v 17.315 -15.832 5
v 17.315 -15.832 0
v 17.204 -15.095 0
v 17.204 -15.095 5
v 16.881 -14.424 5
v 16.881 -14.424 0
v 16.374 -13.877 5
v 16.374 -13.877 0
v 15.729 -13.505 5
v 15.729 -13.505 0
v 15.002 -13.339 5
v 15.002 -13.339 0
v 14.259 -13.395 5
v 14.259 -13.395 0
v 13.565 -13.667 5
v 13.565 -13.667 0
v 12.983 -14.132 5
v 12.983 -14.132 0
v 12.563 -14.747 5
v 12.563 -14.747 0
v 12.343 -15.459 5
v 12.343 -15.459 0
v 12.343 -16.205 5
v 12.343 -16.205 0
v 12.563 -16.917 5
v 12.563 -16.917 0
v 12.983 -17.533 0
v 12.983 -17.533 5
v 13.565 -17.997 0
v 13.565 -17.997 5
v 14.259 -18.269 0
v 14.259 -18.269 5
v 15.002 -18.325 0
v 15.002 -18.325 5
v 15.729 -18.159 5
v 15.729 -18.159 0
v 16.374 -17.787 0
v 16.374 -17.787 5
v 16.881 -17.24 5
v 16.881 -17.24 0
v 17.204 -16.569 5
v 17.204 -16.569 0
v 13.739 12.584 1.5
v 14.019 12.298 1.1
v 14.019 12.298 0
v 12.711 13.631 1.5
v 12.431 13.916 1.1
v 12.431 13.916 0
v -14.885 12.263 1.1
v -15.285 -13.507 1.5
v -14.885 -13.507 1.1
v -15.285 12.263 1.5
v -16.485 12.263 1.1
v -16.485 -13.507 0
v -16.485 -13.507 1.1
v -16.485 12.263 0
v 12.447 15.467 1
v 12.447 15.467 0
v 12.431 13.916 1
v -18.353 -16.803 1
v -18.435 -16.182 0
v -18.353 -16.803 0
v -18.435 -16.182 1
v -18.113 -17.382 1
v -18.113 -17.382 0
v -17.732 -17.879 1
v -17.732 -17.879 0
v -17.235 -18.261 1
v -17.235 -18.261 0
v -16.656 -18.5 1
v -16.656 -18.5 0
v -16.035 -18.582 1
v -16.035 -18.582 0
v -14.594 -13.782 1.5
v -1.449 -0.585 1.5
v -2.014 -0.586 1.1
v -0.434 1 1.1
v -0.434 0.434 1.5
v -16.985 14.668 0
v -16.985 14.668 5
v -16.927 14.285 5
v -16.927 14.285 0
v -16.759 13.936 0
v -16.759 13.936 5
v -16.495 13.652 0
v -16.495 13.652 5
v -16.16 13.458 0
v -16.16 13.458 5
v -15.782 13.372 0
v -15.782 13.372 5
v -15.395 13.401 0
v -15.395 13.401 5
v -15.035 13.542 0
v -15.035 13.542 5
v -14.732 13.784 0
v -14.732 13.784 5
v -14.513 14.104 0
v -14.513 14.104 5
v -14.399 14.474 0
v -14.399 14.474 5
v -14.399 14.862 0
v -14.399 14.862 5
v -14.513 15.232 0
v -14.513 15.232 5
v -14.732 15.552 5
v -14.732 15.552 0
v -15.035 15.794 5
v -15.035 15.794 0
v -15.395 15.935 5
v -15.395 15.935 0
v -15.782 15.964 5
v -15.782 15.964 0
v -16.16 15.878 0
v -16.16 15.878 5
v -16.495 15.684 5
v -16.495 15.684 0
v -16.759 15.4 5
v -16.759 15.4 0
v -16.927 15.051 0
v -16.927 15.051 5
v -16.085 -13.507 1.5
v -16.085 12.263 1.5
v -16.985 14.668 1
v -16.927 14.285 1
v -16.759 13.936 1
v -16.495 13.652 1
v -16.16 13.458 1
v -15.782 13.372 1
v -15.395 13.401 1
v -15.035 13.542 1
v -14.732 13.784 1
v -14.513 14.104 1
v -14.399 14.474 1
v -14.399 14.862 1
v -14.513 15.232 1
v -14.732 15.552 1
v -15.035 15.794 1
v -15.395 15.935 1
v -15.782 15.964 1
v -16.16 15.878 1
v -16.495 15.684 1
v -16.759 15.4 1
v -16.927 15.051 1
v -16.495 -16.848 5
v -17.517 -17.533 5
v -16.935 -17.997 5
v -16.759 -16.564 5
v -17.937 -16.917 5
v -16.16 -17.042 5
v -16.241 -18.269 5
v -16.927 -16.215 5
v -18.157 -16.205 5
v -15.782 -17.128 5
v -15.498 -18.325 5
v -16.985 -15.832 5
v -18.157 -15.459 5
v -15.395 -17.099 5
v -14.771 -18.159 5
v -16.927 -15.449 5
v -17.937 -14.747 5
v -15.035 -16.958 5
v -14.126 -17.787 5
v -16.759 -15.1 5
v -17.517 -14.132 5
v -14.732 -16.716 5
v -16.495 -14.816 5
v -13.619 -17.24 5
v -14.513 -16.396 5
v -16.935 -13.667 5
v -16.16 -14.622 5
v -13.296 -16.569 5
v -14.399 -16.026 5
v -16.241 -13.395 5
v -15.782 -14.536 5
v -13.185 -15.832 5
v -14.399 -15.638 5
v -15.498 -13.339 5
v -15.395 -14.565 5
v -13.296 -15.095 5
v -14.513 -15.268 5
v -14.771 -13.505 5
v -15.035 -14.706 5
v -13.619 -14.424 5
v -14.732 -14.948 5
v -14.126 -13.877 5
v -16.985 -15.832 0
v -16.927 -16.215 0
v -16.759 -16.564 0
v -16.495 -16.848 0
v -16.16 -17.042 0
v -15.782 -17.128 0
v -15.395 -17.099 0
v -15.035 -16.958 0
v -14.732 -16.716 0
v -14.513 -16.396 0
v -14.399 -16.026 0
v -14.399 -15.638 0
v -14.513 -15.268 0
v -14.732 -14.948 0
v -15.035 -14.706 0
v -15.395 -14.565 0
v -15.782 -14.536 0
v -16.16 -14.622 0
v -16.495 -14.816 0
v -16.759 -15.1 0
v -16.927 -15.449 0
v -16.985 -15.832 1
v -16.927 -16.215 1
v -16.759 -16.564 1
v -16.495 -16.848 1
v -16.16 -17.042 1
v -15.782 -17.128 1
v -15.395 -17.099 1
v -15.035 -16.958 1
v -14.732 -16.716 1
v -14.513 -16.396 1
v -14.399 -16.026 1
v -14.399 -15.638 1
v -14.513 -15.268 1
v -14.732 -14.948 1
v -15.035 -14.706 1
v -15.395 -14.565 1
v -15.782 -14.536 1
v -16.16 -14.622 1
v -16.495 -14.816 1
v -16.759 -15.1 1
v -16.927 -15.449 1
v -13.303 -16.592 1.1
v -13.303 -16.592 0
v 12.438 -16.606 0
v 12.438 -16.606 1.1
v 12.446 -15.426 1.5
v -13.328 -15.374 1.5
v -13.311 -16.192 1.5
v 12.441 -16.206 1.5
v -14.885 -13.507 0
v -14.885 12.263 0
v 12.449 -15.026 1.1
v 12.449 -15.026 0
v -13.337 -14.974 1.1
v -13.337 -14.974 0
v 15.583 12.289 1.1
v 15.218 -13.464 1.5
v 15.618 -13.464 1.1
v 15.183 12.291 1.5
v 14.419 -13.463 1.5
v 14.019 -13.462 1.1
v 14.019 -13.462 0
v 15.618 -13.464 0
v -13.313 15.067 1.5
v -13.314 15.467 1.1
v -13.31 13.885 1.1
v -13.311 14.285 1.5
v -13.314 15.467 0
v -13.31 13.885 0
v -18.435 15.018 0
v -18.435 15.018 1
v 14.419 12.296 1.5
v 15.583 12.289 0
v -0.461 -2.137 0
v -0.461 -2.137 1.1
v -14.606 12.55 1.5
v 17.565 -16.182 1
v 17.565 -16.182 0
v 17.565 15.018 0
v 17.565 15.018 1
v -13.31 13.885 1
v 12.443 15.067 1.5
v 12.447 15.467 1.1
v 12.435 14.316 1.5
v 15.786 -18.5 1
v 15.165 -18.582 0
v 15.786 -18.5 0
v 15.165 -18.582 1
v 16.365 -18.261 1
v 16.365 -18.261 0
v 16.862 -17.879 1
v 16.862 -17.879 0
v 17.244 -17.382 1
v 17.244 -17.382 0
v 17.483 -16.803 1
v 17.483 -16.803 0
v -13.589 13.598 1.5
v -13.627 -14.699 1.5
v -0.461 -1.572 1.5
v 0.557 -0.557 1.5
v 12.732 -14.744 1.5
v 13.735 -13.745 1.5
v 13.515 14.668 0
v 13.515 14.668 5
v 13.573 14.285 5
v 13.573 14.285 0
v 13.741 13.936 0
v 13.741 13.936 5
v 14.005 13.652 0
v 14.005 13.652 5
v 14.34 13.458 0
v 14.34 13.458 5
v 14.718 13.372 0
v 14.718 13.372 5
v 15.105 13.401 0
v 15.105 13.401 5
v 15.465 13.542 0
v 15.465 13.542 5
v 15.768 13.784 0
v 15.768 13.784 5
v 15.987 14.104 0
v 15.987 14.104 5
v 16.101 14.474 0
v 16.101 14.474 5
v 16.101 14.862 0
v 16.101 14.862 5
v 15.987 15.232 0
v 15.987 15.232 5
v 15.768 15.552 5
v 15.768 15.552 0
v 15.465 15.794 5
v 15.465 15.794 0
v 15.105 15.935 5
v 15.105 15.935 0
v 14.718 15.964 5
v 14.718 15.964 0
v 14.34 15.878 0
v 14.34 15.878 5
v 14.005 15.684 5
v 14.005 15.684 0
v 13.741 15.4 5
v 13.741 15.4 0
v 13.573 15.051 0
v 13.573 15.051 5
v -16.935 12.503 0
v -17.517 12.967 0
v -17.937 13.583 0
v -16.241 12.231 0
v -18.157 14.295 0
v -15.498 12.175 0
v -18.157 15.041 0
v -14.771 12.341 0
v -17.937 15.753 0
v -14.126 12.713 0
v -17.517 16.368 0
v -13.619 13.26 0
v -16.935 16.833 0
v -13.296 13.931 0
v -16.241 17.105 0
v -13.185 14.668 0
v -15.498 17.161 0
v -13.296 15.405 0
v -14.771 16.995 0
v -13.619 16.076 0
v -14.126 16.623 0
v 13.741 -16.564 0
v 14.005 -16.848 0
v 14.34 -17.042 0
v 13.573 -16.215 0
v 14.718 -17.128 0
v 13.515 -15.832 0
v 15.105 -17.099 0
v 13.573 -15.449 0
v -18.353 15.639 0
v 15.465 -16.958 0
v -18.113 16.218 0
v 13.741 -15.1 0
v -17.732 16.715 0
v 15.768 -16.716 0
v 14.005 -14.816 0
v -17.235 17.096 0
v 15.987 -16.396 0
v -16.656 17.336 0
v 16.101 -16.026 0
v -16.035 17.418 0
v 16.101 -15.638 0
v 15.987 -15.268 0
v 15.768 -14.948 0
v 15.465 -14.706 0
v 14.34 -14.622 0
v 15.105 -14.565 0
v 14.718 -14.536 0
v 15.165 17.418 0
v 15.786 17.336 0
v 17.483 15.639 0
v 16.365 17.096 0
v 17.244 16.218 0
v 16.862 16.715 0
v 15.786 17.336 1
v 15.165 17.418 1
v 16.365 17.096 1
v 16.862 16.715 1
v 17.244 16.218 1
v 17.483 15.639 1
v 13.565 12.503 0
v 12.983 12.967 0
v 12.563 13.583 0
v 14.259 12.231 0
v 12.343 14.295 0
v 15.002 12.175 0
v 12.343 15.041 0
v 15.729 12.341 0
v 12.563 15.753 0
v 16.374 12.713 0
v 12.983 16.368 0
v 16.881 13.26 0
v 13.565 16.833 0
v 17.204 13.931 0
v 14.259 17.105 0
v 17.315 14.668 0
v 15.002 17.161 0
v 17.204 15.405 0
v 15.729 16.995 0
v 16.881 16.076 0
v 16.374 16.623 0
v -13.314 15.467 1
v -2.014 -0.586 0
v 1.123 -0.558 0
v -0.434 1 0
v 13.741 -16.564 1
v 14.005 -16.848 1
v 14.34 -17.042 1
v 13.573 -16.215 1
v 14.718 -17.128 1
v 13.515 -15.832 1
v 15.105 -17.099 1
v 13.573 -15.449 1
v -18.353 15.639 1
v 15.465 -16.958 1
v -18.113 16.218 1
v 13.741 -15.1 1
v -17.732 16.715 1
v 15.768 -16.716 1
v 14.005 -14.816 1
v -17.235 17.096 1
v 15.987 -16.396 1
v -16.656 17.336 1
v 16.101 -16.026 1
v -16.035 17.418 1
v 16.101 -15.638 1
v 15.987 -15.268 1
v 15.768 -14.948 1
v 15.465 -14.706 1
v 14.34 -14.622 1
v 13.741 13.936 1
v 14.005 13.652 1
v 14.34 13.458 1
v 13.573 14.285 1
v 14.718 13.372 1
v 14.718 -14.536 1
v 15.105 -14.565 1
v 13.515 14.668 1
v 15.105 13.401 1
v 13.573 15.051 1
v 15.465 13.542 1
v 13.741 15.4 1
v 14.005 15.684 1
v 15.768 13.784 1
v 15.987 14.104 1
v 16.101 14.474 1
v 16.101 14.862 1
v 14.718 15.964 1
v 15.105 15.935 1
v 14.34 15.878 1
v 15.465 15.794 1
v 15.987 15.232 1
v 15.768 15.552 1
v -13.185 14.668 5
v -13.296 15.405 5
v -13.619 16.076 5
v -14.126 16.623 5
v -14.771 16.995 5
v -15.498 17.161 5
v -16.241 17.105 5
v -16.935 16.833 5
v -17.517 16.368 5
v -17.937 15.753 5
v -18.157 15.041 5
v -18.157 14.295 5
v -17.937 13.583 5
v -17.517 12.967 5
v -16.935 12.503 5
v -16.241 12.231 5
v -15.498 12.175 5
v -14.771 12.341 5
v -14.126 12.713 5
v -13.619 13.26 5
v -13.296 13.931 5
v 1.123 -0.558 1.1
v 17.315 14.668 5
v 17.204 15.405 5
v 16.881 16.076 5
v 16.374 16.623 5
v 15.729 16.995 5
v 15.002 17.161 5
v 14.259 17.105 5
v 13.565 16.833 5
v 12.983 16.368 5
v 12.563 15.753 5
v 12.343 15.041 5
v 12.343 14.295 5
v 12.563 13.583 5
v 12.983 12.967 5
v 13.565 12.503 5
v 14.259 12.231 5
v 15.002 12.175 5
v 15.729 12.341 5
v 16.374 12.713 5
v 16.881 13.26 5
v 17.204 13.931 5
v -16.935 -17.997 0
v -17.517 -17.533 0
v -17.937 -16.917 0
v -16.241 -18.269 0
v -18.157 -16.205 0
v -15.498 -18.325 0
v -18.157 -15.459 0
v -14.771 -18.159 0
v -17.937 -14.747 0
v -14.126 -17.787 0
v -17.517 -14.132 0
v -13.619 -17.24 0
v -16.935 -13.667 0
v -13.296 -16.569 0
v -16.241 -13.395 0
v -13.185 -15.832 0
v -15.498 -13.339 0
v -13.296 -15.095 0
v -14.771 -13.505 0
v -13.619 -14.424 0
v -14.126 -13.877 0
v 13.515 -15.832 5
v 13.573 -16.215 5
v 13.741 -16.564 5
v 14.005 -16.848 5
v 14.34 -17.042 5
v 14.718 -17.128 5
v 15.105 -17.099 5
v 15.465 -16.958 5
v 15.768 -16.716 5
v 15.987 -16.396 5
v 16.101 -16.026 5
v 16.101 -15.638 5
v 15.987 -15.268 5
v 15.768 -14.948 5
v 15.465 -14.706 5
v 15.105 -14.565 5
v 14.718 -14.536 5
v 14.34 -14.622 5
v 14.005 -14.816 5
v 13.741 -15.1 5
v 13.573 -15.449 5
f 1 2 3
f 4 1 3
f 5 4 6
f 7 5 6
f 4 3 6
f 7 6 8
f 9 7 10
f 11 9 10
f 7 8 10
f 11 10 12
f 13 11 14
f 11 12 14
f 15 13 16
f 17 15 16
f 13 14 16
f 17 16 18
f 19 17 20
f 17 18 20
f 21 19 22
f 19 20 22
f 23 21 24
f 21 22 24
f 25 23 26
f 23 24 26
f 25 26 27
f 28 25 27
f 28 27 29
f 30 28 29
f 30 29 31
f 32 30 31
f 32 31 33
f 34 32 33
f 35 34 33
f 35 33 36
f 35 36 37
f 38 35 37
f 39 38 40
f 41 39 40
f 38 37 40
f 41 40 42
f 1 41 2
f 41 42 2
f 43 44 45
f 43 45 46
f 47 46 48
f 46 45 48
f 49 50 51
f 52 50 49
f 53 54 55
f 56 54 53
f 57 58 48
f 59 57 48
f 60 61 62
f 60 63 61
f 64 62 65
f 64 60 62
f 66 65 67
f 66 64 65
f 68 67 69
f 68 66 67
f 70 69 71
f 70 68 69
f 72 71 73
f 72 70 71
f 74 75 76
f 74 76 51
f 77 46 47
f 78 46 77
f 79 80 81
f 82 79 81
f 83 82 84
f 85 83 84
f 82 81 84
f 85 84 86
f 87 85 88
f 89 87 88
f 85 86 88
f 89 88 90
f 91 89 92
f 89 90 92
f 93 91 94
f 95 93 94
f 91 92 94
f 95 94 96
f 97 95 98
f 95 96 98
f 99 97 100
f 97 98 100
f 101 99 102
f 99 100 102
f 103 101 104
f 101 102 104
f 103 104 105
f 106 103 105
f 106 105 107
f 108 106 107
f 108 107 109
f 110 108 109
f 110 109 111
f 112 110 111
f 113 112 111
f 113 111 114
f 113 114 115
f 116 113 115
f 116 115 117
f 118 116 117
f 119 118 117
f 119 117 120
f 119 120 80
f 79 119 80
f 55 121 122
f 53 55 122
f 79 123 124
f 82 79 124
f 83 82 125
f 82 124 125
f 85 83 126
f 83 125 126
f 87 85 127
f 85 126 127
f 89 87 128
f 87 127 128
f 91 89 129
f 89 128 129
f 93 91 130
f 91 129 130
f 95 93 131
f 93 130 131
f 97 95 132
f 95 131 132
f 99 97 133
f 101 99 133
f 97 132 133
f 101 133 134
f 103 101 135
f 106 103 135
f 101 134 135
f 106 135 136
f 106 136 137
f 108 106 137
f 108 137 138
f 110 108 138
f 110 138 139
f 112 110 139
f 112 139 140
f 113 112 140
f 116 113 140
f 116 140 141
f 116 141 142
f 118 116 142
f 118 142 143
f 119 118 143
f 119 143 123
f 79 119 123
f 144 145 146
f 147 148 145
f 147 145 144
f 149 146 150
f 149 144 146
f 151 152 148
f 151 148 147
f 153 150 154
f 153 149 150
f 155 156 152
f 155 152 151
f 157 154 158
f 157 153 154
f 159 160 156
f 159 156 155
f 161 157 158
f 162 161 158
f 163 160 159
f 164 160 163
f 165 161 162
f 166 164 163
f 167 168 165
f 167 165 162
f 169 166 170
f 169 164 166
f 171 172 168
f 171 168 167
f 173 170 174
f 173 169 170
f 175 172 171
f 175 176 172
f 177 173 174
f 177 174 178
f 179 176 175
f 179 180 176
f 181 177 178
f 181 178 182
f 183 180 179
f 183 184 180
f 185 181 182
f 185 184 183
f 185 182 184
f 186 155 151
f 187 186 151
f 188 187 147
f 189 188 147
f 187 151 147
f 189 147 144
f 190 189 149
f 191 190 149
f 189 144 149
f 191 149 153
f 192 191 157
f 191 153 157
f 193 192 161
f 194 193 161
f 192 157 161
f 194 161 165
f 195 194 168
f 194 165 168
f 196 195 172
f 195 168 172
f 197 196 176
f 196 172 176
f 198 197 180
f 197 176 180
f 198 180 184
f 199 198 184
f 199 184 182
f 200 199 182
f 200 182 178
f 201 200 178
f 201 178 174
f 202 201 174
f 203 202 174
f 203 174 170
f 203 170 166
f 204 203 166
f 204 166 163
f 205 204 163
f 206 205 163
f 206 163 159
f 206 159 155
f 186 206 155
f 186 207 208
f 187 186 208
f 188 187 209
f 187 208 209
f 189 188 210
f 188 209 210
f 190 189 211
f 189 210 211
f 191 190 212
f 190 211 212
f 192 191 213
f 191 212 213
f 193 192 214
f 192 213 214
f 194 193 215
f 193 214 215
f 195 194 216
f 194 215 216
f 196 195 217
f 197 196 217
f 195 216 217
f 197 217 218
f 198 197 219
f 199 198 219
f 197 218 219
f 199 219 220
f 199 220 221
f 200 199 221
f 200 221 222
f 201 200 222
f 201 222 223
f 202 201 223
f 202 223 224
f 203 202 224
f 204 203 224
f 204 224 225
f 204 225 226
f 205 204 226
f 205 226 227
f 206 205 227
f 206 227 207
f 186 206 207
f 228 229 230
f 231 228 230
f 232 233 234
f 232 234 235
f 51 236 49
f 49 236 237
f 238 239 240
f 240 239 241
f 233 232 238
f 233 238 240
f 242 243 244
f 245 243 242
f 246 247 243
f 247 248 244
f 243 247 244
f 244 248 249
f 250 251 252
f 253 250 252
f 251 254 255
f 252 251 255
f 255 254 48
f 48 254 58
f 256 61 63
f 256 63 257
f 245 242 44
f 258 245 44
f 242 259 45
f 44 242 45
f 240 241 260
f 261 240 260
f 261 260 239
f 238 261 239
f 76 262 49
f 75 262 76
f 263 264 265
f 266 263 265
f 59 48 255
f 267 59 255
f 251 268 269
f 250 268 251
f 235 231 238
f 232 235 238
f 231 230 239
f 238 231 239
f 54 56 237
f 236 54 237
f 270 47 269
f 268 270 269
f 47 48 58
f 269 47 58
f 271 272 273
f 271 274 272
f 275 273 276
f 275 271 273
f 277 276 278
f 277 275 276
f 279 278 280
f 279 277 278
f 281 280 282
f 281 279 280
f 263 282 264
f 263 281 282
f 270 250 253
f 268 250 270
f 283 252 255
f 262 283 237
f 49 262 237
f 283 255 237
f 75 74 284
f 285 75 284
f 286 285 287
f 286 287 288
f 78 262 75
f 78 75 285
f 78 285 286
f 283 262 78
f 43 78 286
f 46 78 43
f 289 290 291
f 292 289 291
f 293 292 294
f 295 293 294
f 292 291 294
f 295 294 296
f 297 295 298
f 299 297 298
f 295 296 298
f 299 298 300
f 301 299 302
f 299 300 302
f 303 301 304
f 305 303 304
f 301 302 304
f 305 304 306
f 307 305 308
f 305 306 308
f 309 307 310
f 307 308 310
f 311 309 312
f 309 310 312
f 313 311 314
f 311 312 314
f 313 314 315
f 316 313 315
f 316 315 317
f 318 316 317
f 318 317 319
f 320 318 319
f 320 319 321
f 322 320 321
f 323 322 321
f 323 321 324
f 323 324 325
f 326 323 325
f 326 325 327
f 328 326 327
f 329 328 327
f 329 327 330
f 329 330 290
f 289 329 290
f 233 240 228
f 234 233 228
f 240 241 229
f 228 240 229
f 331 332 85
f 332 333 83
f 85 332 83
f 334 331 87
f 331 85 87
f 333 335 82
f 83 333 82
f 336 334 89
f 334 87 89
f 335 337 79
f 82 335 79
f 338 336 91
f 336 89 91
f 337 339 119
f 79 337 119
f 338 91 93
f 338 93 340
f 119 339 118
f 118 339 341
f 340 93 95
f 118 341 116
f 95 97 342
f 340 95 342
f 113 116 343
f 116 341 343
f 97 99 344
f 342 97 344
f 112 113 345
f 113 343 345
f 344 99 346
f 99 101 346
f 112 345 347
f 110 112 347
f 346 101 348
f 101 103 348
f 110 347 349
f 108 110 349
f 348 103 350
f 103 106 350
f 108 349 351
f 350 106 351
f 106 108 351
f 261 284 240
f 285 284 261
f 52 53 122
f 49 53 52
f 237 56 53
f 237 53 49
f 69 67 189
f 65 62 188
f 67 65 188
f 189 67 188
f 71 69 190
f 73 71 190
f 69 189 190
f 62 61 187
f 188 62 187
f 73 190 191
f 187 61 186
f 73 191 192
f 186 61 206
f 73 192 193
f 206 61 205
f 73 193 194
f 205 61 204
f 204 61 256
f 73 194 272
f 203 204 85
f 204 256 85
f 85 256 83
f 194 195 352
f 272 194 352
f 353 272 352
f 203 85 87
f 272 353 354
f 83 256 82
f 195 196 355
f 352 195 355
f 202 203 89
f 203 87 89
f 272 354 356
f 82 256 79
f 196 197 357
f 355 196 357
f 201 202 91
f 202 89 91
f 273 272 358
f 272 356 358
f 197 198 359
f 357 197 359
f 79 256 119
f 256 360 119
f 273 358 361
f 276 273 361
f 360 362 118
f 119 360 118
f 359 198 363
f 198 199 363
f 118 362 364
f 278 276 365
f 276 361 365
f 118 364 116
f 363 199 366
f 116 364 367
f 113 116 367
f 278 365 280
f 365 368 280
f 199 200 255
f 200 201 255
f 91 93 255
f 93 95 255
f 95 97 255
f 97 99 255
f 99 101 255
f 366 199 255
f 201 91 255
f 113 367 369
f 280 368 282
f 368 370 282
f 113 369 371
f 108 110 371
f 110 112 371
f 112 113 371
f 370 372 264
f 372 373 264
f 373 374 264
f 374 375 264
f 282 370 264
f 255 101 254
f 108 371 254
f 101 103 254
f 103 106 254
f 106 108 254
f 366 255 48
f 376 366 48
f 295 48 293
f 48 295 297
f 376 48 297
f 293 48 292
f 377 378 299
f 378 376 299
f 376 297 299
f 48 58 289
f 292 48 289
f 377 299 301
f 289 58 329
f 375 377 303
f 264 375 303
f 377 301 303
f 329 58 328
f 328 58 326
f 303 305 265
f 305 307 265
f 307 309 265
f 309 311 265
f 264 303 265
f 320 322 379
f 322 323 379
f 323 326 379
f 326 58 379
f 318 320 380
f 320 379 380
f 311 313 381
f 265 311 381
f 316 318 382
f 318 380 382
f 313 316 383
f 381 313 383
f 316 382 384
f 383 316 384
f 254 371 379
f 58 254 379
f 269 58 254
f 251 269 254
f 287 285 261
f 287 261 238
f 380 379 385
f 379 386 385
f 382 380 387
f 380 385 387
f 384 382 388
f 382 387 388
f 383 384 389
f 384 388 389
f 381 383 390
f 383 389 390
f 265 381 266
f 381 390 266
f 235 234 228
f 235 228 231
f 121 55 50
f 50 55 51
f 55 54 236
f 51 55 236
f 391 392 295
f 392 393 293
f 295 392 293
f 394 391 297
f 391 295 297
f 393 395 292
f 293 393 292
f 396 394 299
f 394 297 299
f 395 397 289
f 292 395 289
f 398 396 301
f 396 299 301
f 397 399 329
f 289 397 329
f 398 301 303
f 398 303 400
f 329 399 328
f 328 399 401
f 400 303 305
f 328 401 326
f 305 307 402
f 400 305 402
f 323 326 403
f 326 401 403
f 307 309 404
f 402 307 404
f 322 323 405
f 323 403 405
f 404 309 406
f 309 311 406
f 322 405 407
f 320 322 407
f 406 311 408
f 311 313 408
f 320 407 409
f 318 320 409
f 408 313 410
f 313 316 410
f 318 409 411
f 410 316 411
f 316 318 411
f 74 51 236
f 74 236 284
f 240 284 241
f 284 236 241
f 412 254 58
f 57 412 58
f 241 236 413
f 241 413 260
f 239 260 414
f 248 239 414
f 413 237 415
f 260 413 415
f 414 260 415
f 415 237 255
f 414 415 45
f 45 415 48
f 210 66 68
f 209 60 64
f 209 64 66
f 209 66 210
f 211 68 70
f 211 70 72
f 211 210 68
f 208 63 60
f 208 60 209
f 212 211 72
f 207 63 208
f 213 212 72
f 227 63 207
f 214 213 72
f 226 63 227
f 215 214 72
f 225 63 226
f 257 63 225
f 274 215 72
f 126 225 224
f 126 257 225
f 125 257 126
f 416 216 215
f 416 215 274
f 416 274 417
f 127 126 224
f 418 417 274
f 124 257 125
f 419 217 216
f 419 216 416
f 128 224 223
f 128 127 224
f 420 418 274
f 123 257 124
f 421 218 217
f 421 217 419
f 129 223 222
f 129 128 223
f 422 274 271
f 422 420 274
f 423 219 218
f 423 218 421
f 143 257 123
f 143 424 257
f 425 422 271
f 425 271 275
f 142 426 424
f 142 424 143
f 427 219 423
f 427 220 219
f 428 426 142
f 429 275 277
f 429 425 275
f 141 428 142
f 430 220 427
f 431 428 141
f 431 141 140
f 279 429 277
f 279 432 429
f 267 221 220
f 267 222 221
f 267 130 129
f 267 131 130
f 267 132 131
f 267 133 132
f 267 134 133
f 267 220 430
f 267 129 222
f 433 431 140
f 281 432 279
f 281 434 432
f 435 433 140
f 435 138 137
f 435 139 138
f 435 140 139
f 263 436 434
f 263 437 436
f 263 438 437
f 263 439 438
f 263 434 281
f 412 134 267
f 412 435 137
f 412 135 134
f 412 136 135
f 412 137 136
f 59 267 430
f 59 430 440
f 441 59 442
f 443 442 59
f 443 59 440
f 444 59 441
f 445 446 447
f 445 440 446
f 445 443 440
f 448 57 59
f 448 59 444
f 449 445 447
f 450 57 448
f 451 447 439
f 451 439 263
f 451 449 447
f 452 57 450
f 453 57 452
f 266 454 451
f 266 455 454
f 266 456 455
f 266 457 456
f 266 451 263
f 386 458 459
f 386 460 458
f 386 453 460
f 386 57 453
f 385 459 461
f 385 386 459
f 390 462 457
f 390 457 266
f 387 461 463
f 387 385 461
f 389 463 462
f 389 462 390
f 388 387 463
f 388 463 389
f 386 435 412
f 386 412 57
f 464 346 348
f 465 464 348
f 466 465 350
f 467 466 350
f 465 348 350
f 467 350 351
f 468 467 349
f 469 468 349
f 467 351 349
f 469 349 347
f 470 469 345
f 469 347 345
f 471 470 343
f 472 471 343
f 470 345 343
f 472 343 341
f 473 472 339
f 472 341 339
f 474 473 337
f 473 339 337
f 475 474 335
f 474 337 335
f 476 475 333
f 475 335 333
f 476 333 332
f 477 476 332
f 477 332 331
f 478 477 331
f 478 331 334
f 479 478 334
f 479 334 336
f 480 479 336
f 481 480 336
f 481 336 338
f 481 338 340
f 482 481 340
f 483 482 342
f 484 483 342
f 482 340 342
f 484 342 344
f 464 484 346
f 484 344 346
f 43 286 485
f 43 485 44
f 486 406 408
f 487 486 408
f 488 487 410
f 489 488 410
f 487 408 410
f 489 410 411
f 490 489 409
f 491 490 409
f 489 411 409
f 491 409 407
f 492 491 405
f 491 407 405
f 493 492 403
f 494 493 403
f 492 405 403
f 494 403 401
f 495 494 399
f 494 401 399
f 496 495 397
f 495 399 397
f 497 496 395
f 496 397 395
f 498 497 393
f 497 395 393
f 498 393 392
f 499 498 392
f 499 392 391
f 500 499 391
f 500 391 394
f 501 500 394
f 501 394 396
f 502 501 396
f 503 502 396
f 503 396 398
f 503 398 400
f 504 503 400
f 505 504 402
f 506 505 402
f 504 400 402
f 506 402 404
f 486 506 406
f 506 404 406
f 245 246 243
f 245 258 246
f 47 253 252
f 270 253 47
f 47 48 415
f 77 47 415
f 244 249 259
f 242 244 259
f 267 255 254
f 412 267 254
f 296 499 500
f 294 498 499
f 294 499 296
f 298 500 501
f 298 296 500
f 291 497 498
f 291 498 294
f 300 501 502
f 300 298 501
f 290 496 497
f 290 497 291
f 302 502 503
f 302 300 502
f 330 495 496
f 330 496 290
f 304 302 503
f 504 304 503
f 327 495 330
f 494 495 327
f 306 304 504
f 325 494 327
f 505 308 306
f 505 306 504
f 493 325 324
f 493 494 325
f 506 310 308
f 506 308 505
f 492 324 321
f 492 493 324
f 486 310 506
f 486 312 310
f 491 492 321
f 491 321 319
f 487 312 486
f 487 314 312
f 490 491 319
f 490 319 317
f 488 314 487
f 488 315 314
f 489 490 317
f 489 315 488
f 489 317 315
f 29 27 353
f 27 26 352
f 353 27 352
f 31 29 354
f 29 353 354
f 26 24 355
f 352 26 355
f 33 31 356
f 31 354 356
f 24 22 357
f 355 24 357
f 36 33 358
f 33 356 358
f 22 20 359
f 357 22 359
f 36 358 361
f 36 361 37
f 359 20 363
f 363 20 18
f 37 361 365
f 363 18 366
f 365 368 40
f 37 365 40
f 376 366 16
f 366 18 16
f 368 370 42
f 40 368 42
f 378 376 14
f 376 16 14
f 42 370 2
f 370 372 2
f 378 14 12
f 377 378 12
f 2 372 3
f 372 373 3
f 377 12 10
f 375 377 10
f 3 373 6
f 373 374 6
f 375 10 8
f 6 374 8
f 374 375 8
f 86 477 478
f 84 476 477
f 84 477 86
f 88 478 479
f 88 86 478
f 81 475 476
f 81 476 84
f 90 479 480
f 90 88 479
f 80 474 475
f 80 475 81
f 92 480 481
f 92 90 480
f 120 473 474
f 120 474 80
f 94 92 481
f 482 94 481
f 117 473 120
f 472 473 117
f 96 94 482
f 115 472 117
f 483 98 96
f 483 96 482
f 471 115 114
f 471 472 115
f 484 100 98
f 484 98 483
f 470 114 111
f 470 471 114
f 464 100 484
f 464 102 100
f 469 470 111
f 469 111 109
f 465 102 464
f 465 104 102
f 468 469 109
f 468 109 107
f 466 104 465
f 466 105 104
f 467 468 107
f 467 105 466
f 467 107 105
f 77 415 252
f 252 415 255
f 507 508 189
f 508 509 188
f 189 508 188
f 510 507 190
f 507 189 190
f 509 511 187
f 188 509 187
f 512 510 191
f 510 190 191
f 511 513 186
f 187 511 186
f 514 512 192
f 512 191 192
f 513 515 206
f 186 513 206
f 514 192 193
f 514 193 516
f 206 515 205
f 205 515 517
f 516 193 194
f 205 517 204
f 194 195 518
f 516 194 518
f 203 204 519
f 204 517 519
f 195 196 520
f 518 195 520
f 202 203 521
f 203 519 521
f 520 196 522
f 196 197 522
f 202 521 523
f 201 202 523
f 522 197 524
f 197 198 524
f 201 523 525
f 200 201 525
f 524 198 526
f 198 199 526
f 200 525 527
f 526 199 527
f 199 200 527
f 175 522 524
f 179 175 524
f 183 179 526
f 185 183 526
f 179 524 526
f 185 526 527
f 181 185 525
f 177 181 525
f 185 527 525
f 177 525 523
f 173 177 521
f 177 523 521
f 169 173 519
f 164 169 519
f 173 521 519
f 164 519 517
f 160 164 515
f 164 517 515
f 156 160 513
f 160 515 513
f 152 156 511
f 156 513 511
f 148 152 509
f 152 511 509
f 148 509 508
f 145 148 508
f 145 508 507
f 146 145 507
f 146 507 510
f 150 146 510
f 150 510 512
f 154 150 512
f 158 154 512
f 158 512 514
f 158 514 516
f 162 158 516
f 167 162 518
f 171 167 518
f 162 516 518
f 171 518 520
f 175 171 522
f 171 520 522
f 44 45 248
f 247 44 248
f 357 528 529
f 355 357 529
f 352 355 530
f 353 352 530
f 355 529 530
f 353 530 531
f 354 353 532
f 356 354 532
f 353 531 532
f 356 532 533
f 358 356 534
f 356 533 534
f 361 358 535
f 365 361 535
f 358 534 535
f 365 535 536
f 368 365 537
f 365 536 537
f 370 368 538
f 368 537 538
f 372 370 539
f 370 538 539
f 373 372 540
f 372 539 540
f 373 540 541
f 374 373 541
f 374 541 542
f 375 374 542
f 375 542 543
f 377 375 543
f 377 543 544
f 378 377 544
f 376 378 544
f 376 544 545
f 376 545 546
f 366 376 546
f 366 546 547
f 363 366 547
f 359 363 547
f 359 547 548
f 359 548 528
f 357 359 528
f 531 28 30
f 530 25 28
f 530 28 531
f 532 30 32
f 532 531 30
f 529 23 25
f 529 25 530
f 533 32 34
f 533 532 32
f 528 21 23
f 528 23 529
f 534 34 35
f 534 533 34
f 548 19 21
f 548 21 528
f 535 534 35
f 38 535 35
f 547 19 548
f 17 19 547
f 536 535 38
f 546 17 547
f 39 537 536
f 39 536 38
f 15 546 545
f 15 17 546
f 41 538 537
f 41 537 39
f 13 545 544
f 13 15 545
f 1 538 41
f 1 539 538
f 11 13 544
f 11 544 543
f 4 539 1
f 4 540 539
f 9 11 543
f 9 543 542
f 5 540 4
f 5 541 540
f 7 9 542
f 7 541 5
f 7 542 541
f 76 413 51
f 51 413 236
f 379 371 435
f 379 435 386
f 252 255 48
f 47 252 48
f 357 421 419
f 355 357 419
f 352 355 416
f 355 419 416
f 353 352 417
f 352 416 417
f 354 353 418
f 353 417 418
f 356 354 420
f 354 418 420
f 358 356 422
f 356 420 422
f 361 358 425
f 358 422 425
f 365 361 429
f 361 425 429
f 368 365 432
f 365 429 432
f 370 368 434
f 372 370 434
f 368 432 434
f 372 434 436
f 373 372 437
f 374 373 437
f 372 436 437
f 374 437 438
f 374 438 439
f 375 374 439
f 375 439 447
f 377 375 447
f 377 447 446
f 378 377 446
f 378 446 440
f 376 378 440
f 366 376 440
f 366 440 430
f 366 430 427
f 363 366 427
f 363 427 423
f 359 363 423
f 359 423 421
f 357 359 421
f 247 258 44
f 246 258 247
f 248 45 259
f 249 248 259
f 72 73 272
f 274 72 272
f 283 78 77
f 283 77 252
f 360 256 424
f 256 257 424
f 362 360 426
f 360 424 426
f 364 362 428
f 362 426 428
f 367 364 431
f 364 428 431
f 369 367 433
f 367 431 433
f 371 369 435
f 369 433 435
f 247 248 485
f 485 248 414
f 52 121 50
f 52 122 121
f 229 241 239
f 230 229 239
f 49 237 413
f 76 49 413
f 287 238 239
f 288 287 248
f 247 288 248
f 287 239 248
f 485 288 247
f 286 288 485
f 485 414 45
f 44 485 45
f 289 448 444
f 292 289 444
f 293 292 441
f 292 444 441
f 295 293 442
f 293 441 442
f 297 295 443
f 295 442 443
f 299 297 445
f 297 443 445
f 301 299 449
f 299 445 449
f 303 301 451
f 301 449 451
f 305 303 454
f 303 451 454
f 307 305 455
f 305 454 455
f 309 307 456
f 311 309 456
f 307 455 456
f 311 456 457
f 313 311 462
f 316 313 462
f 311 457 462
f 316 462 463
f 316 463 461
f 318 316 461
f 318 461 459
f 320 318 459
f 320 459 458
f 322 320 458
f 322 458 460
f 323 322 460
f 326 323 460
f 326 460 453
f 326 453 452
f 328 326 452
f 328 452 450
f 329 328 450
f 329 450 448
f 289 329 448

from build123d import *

# Parameters (mm, degrees)
F1_W      = 36
F1_H      = 36
F1_W_2    = 1.6
F1_H_2    = 25.7701668888
F3_DEPTH  = 1
F4_DEPTH  = 1.5
F0_R      = 2.5
F5_DEPTH  = 5
F6_D      = 2.6
F6_2_D    = 2.6
F6_3_D    = 2.6
F6_4_D    = 2.6
F6_5_D    = 2.6
F7_R      = 2.4
F8_SIZE   = 0.4
F8_2_SIZE = 0.4
F8_3_SIZE = 0.4
F8_4_SIZE = 0.4
F8_5_SIZE = 0.4


with BuildPart() as f3:
    # F1 (on Top) → F3 (new body)
    with BuildSketch(Plane.XY):
        with Locations((-0.4347223143, -0.5820784718)):
            Rectangle(F1_W, F1_H)
        Polygon((-14.8847223143, -13.5069610551), (-16.4847223143, -13.5069610551), (-16.4847223143, 12.2632058337), (-14.8847223143, 12.2632058337), (-13.3103623299, 13.8853522568), (-13.3135003961, 15.4672487407), (12.4465066948, 15.4672487407), (12.4310133279, 13.9160681699), (14.0187104725, 12.2982209828), (15.5826791858, 12.2886159704), (15.6178511423, -13.4644053848), (14.0188894569, -13.4623177689), (12.4487861792, -15.0260276361), (12.4379802584, -16.6056784602), (-13.3030944143, -16.5922419713), (-13.3366351046, -14.9738905812), align=None, mode=Mode.SUBTRACT)
        Polygon((14.0187104725, 12.2982209828), (1.1232575467, -0.557994994), (14.0188894569, -13.4623177689), align=None)
        Polygon((12.4310133279, 13.9160681699), (-13.3103623299, 13.8853522568), (-0.4341048877, 1.0004170071), align=None)
        Polygon((-0.4608600238, -2.1372925756), (-13.3366351046, -14.9738905812), (12.4487861792, -15.0260276361), align=None)
        Polygon((-14.8847223143, 12.2632058337), (-14.8847223143, -13.5069610551), (-2.0144917355, -0.5861774483), align=None)
        with Locations((-15.6847223143, -0.6218776107)):
            Rectangle(F1_W_2, F1_H_2)
        Polygon((12.4487861792, -15.0260276361), (-13.3366351046, -14.9738905812), (-13.3030944143, -16.5922419713), (12.4379802584, -16.6056784602), align=None)
        Polygon((-13.3103623299, 13.8853522568), (-14.8847223143, 12.2632058337), (-2.0144917355, -0.5861774483), (-0.4341048877, 1.0004170071), align=None)
        Polygon((14.0187104725, 12.2982209828), (14.0188894569, -13.4623177689), (15.6178511423, -13.4644053848), (15.5826791858, 12.2886159704), align=None)
        Polygon((12.4310133279, 13.9160681699), (-0.4341048877, 1.0004170071), (1.1232575467, -0.557994994), (14.0187104725, 12.2982209828), align=None)
        Polygon((1.1232575467, -0.557994994), (-0.4608600238, -2.1372925756), (12.4487861792, -15.0260276361), (14.0188894569, -13.4623177689), align=None)
        Polygon((-2.0144917355, -0.5861774483), (-14.8847223143, -13.5069610551), (-13.3366351046, -14.9738905812), (-0.4608600238, -2.1372925756), align=None)
        Polygon((-0.4341048877, 1.0004170071), (-2.0144917355, -0.5861774483), (-0.4608600238, -2.1372925756), (1.1232575467, -0.557994994), align=None)
    extrude(amount=F3_DEPTH)

    # F6 (through all)
    with Locations(Plane(origin=(0, 0, 0), x_dir=(1, 0, 0), z_dir=(0, 0, -1))):
        with Locations((14.8152776857, -14.6679215282), (-15.6847223143, -14.6679215282), (-15.6847223143, 15.8320784718), (14.8152776857, 15.8320784718)):
            Hole(F6_D / 2)

    # F7
    f7_edges = [f3.edges().sort_by_distance(p)[0] for p in [
        (17.565278, -18.582078, 0.5),
        (17.565278, 17.417922, 0.5),
        (-18.434722, -18.582078, 0.5),
        (-18.434722, 17.417922, 0.5),
    ]]
    fillet(f7_edges, radius=F7_R)


with BuildPart() as f4:
    # F1 (on Top) → F4 (new body)
    with BuildSketch(Plane.XY):
        with Locations((-15.6847223143, -0.6218776107)):
            Rectangle(F1_W_2, F1_H_2)
    extrude(amount=F4_DEPTH)

    # F8
    f8_edges = [f4.edges().sort_by_distance(p)[0] for p in [
        (-14.884722, -0.621878, 1.5),
        (-16.484722, -0.621878, 1.5),
    ]]
    chamfer(f8_edges, length=F8_SIZE)


with BuildPart() as f4b:
    # F1 (on Top) → F4, piece 2 (new body)
    with BuildSketch(Plane.XY):
        Polygon((12.4487861792, -15.0260276361), (-13.3366351046, -14.9738905812), (-13.3030944143, -16.5922419713), (12.4379802584, -16.6056784602), align=None)
    extrude(amount=F4_DEPTH)

    # F8#3
    f8_3_edges = [f4b.edges().sort_by_distance(p)[0] for p in [
        (-0.443924, -14.999959, 1.5),
        (-0.432557, -16.59896, 1.5),
    ]]
    chamfer(f8_3_edges, length=F8_3_SIZE)


with BuildPart() as f4c:
    # F1 (on Top) → F4, piece 3 (new body)
    with BuildSketch(Plane.XY):
        Polygon((-2.0144917355, -0.5861774483), (-14.8847223143, -13.5069610551), (-13.3366351046, -14.9738905812), (-0.4608600238, -2.1372925756), align=None)
        Polygon((1.1232575467, -0.557994994), (-0.4608600238, -2.1372925756), (12.4487861792, -15.0260276361), (14.0188894569, -13.4623177689), align=None)
        Polygon((-0.4341048877, 1.0004170071), (-2.0144917355, -0.5861774483), (-0.4608600238, -2.1372925756), (1.1232575467, -0.557994994), align=None)
        Polygon((-13.3103623299, 13.8853522568), (-14.8847223143, 12.2632058337), (-2.0144917355, -0.5861774483), (-0.4341048877, 1.0004170071), align=None)
        Polygon((12.4310133279, 13.9160681699), (-0.4341048877, 1.0004170071), (1.1232575467, -0.557994994), (14.0187104725, 12.2982209828), align=None)
    extrude(amount=F4_DEPTH)

    # F8#2
    f8_2_edges = [f4c.edges().sort_by_distance(p)[0] for p in [
        (-8.449607, -7.046569, 1.5),
        (-6.898748, -8.555592, 1.5),
        (-8.449607, 5.838514, 1.5),
        (-6.872234, 7.442885, 1.5),
        (5.998454, 7.458243, 1.5),
        (7.570984, 5.870113, 1.5),
        (7.571074, -7.010156, 1.5),
        (5.993963, -8.58166, 1.5),
    ]]
    chamfer(f8_2_edges, length=F8_2_SIZE)


with BuildPart() as f4d:
    # F1 (on Top) → F4, piece 4 (new body)
    with BuildSketch(Plane.XY):
        Polygon((-13.3135003961, 15.4672487407), (-13.3103623299, 13.8853522568), (12.4310133279, 13.9160681699), (12.4465066948, 15.4672487407), align=None)
    extrude(amount=F4_DEPTH)

    # F8#5
    f8_5_edges = [f4d.edges().sort_by_distance(p)[0] for p in [
        (-0.433497, 15.467249, 1.5),
        (-0.439675, 13.90071, 1.5),
    ]]
    chamfer(f8_5_edges, length=F8_5_SIZE)


with BuildPart() as f4e:
    # F1 (on Top) → F4, piece 5 (new body)
    with BuildSketch(Plane.XY):
        Polygon((14.0187104725, 12.2982209828), (14.0188894569, -13.4623177689), (15.6178511423, -13.4644053848), (15.5826791858, 12.2886159704), align=None)
    extrude(amount=F4_DEPTH)

    # F8#4
    f8_4_edges = [f4e.edges().sort_by_distance(p)[0] for p in [
        (14.0188, -0.582048, 1.5),
        (15.600265, -0.587895, 1.5),
    ]]
    chamfer(f8_4_edges, length=F8_4_SIZE)


with BuildPart() as f5:
    # F0 (on Top) → F5 (new body)
    with BuildSketch(Plane.XY):
        with Locations((-15.6847223143, 14.6679215282)):
            Circle(F0_R)
    extrude(amount=F5_DEPTH)

    # F6#2 (through all)
    with Locations(Plane(origin=(0, 0, 0), x_dir=(1, 0, 0), z_dir=(0, 0, -1))):
        with Locations((14.8152776857, -14.6679215282), (-15.6847223143, -14.6679215282), (-15.6847223143, 15.8320784718), (14.8152776857, 15.8320784718)):
            Hole(F6_2_D / 2)


with BuildPart() as f5b:
    # F0 (on Top) → F5, piece 2 (new body)
    with BuildSketch(Plane.XY):
        with Locations((14.8152776857, 14.6679215282)):
            Circle(F0_R)
    extrude(amount=F5_DEPTH)

    # F6#3 (through all)
    with Locations(Plane(origin=(0, 0, 0), x_dir=(1, 0, 0), z_dir=(0, 0, -1))):
        with Locations((14.8152776857, -14.6679215282), (-15.6847223143, -14.6679215282), (-15.6847223143, 15.8320784718), (14.8152776857, 15.8320784718)):
            Hole(F6_3_D / 2)


with BuildPart() as f5c:
    # F0 (on Top) → F5, piece 3 (new body)
    with BuildSketch(Plane.XY):
        with Locations((14.8152776857, -15.8320784718)):
            Circle(F0_R)
    extrude(amount=F5_DEPTH)

    # F6#4 (through all)
    with Locations(Plane(origin=(0, 0, 0), x_dir=(1, 0, 0), z_dir=(0, 0, -1))):
        with Locations((14.8152776857, -14.6679215282), (-15.6847223143, -14.6679215282), (-15.6847223143, 15.8320784718), (14.8152776857, 15.8320784718)):
            Hole(F6_4_D / 2)


with BuildPart() as f5d:
    # F0 (on Top) → F5, piece 4 (new body)
    with BuildSketch(Plane.XY):
        with Locations((-15.6847223143, -15.8320784718)):
            Circle(F0_R)
    extrude(amount=F5_DEPTH)

    # F6#5 (through all)
    with Locations(Plane(origin=(0, 0, 0), x_dir=(1, 0, 0), z_dir=(0, 0, -1))):
        with Locations((14.8152776857, -14.6679215282), (-15.6847223143, -14.6679215282), (-15.6847223143, 15.8320784718), (14.8152776857, 15.8320784718)):
            Hole(F6_5_D / 2)


solid = Compound([f3.part, f4.part, f4b.part, f4c.part, f4d.part, f4e.part, f5.part, f5b.part, f5c.part, f5d.part])
